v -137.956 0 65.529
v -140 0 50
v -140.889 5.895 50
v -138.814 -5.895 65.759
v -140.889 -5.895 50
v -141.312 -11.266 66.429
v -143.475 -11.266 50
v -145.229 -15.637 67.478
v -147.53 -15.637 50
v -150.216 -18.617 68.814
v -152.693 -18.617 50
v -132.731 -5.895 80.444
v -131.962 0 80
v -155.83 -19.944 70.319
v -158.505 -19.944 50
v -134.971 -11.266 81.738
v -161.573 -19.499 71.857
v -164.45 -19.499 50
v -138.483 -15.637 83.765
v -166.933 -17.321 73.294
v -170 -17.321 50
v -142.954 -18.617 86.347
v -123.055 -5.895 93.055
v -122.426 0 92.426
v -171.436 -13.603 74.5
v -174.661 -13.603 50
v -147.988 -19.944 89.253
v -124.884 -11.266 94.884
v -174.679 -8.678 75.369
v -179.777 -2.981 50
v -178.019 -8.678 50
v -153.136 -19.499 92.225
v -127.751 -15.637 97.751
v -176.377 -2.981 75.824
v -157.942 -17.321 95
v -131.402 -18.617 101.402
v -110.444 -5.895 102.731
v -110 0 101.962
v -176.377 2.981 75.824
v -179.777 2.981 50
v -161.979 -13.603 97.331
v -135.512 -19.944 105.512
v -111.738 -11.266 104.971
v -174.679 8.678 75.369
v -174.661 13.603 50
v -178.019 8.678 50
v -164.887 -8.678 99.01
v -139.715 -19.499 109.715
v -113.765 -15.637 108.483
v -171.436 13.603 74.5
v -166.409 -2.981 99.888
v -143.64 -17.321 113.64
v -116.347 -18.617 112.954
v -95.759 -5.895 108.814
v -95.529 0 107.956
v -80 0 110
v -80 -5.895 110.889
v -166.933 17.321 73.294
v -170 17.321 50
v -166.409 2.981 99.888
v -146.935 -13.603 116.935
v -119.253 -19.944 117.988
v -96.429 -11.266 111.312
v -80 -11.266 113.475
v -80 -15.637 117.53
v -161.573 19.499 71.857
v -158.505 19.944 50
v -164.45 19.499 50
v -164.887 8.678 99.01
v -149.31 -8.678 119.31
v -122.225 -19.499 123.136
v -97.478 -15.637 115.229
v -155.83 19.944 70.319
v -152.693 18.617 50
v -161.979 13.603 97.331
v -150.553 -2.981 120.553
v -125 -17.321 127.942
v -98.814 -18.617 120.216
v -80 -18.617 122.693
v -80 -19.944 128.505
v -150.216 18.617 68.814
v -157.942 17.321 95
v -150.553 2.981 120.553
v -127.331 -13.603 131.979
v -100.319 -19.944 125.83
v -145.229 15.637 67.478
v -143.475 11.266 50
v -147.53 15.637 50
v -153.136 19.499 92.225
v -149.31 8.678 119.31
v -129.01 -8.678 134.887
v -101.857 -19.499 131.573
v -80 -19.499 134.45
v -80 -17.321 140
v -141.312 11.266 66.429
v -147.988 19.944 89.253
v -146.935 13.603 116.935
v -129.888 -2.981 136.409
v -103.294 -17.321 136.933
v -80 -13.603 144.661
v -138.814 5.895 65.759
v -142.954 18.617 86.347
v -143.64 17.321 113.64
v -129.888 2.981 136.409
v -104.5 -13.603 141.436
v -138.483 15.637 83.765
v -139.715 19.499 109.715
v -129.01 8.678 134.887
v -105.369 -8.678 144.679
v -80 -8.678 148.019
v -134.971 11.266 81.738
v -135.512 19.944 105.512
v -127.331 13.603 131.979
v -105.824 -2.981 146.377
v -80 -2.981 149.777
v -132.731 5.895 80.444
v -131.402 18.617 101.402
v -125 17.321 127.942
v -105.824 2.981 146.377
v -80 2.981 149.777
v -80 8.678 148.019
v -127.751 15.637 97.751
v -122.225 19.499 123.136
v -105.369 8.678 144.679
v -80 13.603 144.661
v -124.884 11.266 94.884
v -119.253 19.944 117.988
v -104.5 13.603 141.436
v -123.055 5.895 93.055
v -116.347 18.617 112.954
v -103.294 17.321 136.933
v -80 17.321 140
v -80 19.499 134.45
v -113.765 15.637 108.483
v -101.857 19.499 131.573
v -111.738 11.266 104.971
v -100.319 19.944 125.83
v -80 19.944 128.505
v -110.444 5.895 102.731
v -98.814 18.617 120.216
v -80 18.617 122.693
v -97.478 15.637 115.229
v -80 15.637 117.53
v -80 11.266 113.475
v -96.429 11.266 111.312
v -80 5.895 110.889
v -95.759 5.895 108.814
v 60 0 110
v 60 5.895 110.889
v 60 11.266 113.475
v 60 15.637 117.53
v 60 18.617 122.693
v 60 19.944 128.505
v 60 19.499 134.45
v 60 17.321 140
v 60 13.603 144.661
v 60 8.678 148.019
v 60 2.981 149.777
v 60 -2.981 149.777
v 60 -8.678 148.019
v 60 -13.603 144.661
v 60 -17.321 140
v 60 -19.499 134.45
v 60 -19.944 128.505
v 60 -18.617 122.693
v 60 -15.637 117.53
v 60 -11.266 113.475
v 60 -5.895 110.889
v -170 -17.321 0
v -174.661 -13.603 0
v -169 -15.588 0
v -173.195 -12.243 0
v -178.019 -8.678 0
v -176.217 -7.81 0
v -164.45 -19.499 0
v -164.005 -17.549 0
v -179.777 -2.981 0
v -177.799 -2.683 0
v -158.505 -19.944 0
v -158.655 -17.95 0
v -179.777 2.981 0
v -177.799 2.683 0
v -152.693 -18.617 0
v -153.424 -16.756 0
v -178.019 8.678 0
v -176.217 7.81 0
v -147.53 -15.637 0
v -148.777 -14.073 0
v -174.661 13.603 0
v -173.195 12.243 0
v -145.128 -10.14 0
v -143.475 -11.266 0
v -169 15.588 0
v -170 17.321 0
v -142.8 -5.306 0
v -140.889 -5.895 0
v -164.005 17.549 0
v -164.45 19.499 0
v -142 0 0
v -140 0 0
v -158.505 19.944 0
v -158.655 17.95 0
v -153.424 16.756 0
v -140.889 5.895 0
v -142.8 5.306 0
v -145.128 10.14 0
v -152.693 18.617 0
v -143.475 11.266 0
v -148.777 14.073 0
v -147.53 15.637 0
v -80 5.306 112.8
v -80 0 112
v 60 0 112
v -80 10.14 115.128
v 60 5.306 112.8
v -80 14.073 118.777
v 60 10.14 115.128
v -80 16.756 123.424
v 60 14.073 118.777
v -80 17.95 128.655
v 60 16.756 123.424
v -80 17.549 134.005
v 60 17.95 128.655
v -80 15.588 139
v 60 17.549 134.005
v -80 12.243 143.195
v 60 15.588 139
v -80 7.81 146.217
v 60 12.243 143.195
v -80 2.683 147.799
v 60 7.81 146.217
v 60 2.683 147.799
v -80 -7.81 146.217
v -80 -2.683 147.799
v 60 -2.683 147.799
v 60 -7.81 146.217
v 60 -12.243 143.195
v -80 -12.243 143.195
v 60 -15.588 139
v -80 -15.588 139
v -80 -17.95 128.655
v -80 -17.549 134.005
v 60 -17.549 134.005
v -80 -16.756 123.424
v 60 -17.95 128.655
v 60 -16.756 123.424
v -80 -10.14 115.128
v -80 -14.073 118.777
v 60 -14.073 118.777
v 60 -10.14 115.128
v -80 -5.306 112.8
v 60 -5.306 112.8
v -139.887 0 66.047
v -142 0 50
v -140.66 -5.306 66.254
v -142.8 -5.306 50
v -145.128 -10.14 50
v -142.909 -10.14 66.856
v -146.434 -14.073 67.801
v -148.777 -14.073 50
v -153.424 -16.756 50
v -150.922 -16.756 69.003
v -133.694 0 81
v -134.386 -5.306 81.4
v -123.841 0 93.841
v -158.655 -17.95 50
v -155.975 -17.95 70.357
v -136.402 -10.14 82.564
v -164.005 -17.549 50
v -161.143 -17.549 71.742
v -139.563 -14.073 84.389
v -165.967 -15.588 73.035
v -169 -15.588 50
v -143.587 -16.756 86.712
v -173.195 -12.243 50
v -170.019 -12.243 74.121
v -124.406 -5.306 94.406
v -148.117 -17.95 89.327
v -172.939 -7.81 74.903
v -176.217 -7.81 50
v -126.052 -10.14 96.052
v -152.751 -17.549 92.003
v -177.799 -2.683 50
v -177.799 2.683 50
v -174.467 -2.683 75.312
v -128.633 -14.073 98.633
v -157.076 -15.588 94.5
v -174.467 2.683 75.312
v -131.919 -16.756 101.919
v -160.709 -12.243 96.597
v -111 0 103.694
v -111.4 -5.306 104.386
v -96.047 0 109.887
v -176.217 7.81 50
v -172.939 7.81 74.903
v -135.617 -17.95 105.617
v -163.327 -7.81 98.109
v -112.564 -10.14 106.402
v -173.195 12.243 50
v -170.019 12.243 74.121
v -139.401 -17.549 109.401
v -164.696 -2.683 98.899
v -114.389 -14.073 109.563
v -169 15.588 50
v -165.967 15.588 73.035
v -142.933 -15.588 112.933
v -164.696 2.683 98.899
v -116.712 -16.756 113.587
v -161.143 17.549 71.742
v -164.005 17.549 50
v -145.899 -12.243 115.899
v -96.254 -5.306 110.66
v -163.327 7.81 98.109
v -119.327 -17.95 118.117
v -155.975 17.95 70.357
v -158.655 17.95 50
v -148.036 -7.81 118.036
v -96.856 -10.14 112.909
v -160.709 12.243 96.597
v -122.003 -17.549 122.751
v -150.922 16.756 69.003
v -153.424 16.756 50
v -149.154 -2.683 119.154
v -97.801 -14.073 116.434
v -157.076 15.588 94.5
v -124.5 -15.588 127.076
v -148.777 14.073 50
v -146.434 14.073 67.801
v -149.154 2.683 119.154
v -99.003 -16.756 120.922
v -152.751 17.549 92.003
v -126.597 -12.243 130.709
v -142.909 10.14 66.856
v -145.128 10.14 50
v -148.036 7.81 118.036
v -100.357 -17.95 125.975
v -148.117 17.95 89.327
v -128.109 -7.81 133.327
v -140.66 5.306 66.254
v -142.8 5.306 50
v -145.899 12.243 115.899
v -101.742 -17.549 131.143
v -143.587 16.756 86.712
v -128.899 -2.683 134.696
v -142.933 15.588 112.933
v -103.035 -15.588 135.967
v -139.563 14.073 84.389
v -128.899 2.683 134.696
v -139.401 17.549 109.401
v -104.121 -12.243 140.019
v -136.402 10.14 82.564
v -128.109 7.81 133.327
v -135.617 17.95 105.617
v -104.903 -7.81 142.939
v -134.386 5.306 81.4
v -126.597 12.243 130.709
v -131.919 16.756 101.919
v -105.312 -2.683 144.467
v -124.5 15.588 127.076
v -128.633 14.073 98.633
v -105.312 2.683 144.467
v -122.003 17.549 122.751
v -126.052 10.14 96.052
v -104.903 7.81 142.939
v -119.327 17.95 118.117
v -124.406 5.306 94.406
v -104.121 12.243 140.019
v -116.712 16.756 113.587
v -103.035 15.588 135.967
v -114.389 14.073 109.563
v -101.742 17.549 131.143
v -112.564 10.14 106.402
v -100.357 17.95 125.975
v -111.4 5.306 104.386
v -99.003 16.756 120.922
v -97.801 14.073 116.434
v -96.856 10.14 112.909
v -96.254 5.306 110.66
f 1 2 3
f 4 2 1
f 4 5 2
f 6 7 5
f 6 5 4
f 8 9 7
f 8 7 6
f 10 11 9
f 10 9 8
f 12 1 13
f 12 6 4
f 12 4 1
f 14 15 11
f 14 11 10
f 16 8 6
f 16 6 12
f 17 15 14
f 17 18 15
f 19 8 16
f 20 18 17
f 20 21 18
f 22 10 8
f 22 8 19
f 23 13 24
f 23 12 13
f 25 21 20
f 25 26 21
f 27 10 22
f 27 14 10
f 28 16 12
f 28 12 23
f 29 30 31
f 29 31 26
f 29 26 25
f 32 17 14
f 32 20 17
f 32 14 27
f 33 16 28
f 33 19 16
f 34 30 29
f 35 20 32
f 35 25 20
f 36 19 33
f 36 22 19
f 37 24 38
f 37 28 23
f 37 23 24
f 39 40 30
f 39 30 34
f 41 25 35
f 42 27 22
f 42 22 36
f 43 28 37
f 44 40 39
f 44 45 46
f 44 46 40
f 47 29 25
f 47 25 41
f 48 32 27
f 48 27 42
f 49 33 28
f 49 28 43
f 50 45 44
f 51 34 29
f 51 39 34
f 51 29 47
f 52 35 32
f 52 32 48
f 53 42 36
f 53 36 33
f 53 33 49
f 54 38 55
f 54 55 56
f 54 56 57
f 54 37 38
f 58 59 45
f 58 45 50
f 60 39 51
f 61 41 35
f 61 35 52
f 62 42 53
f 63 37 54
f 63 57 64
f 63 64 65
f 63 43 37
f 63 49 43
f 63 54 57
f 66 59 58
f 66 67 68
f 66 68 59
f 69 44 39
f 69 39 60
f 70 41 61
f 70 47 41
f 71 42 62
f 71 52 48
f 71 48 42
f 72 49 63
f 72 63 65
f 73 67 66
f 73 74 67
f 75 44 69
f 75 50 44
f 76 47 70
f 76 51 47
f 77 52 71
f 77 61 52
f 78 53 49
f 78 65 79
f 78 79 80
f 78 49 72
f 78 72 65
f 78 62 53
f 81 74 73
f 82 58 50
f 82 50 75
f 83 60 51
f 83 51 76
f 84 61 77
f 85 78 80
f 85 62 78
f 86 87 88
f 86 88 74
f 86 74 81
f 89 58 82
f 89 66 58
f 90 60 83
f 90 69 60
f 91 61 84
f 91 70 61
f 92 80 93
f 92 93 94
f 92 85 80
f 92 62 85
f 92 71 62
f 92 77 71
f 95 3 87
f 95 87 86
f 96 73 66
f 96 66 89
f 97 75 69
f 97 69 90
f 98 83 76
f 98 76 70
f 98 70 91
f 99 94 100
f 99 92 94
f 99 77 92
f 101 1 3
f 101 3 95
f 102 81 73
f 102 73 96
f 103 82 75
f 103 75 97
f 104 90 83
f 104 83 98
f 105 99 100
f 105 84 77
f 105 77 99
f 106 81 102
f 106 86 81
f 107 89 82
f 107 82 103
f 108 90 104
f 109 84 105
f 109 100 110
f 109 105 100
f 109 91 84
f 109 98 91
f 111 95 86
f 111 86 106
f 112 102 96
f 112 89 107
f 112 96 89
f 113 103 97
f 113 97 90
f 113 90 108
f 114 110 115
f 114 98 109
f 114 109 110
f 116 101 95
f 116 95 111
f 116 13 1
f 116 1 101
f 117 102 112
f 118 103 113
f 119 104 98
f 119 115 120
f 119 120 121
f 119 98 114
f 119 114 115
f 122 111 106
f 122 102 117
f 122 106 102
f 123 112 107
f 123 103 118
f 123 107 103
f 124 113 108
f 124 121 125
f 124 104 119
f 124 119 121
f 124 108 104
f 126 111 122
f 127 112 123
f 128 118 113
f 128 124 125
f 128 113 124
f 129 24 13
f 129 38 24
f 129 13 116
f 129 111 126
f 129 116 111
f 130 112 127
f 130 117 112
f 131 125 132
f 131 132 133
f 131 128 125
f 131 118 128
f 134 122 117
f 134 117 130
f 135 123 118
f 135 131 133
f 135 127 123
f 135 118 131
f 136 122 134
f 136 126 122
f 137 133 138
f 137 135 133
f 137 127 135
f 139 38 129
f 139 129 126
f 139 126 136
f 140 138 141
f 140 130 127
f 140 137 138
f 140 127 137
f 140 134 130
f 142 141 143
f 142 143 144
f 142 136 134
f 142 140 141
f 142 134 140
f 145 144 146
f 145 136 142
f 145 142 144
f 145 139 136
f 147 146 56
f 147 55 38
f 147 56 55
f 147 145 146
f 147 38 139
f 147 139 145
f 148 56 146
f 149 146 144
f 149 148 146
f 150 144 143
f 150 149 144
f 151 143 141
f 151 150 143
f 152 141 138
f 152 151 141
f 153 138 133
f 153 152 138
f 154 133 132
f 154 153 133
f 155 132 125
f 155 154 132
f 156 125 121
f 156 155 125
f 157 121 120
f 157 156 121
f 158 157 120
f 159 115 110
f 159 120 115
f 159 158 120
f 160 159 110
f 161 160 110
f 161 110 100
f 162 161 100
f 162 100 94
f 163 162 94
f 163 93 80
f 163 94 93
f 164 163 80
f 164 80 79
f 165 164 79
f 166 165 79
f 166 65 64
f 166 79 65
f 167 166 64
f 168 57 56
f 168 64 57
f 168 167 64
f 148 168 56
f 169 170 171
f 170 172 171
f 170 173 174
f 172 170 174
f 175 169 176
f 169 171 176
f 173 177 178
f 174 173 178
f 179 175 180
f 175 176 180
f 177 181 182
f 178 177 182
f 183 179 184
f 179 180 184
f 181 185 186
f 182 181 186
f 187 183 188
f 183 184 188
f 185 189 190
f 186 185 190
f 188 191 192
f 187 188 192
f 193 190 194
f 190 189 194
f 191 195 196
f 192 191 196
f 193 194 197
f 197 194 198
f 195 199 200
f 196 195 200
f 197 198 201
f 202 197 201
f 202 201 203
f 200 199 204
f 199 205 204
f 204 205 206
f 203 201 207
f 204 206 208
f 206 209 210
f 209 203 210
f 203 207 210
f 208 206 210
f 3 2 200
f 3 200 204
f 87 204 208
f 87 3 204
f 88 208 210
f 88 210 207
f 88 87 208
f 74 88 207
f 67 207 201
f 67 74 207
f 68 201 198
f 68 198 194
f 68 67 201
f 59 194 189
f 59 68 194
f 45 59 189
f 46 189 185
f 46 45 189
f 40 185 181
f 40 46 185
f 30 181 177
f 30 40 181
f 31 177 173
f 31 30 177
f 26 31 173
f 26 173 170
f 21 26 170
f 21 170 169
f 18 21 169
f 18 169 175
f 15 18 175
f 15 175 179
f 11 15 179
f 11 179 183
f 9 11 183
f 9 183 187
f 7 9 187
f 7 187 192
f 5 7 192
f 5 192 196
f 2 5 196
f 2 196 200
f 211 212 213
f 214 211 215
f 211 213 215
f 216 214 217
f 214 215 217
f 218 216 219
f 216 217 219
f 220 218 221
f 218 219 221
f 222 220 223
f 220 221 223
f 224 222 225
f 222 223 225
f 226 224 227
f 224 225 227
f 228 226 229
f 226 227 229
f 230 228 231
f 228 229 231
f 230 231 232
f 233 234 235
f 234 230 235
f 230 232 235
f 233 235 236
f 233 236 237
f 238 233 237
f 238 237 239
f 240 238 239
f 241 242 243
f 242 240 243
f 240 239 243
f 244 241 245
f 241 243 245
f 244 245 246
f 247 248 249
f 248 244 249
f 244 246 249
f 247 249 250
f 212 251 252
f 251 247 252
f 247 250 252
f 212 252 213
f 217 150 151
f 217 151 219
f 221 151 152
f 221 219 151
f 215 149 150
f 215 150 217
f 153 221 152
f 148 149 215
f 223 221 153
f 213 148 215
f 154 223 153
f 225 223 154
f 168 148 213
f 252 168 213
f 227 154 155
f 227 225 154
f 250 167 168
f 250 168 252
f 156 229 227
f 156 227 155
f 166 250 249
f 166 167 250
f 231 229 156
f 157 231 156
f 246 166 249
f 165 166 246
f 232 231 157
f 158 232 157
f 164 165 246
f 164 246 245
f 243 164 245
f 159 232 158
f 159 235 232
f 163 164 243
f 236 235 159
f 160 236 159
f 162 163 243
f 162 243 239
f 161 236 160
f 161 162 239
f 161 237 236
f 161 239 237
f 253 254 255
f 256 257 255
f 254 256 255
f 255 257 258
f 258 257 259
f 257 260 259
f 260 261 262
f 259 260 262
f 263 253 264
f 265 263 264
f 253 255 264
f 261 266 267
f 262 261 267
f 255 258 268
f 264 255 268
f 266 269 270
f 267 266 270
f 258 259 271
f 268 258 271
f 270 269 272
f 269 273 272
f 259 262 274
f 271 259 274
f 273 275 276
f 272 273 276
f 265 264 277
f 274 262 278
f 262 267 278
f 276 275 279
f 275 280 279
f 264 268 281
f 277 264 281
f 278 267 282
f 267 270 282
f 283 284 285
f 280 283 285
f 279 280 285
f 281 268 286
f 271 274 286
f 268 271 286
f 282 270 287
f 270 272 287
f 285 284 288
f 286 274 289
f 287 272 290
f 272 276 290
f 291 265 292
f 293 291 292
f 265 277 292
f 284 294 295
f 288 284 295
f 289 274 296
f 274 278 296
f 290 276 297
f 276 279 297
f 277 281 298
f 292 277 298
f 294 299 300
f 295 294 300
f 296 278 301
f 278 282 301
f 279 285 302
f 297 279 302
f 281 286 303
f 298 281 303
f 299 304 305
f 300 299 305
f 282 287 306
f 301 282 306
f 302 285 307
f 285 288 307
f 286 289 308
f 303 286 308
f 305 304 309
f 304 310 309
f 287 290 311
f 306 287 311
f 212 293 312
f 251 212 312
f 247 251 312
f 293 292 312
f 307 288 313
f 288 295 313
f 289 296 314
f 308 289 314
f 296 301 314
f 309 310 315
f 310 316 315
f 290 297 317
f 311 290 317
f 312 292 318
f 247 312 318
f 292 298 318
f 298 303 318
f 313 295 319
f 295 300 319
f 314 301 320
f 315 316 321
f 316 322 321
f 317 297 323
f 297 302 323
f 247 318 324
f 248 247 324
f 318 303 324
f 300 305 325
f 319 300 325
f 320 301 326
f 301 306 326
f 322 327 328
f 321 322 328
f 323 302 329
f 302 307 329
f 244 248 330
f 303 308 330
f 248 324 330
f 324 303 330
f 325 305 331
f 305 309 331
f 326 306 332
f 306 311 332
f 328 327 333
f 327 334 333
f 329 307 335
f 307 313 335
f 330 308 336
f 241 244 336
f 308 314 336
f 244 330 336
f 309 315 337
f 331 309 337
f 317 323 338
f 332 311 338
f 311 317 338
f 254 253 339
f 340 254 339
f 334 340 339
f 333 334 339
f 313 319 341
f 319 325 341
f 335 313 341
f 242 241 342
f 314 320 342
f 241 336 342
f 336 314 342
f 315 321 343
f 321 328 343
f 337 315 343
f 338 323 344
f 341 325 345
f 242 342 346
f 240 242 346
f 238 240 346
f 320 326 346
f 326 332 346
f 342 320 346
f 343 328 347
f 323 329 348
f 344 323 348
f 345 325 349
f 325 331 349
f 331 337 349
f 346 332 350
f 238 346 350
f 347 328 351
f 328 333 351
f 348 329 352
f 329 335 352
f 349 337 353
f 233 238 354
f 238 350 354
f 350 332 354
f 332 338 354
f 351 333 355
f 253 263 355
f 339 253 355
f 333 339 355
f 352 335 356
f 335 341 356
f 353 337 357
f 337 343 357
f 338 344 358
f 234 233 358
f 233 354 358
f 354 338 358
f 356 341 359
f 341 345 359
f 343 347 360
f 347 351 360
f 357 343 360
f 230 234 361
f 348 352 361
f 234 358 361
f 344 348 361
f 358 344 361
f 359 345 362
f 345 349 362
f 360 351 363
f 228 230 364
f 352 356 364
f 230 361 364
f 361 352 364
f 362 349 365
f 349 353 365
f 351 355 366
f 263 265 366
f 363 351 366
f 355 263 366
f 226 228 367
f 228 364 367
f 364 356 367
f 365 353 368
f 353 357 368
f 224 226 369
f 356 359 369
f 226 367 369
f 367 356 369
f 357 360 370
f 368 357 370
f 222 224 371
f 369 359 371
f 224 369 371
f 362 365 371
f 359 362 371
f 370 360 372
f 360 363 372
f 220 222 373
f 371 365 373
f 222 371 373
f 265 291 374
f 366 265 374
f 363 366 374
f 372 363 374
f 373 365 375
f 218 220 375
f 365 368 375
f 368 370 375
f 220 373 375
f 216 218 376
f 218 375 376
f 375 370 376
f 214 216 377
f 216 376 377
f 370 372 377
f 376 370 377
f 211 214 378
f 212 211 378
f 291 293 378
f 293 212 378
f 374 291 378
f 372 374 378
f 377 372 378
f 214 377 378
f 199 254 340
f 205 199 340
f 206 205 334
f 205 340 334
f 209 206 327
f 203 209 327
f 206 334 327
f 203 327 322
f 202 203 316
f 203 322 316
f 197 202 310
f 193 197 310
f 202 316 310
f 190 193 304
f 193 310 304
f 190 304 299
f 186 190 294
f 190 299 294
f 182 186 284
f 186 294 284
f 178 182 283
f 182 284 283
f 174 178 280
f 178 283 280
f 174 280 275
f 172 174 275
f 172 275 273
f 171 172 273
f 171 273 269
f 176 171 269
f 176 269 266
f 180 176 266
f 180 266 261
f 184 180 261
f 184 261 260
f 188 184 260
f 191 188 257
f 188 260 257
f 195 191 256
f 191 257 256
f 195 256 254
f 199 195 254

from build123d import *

# Parameters (mm, degrees)
F1_R = 20
F3_T = -2


with BuildPart() as f2:
    # F2: sweep along a path in F0
    with BuildLine(Plane.XZ) as f2_path:
        Line((-160, 0), (-160, 50))
        ThreePointArc((-160, 50), (-136.5685424949, 106.5685424949), (-80, 130))
        Line((-80, 130), (60, 130))
    # F1 (on Top) → F2 (sweep)
    with BuildSketch(Plane.XY):
        with Locations((-160, 0)):
            Circle(F1_R)
    sweep(path=f2_path.line)

    # F3
    f3_openings = [f2.faces().sort_by_distance(p)[0] for p in [
        (-160, 0, 0),
        (60, 0, 130),
    ]]
    offset(amount=F3_T, openings=f3_openings)


solid = f2.part
